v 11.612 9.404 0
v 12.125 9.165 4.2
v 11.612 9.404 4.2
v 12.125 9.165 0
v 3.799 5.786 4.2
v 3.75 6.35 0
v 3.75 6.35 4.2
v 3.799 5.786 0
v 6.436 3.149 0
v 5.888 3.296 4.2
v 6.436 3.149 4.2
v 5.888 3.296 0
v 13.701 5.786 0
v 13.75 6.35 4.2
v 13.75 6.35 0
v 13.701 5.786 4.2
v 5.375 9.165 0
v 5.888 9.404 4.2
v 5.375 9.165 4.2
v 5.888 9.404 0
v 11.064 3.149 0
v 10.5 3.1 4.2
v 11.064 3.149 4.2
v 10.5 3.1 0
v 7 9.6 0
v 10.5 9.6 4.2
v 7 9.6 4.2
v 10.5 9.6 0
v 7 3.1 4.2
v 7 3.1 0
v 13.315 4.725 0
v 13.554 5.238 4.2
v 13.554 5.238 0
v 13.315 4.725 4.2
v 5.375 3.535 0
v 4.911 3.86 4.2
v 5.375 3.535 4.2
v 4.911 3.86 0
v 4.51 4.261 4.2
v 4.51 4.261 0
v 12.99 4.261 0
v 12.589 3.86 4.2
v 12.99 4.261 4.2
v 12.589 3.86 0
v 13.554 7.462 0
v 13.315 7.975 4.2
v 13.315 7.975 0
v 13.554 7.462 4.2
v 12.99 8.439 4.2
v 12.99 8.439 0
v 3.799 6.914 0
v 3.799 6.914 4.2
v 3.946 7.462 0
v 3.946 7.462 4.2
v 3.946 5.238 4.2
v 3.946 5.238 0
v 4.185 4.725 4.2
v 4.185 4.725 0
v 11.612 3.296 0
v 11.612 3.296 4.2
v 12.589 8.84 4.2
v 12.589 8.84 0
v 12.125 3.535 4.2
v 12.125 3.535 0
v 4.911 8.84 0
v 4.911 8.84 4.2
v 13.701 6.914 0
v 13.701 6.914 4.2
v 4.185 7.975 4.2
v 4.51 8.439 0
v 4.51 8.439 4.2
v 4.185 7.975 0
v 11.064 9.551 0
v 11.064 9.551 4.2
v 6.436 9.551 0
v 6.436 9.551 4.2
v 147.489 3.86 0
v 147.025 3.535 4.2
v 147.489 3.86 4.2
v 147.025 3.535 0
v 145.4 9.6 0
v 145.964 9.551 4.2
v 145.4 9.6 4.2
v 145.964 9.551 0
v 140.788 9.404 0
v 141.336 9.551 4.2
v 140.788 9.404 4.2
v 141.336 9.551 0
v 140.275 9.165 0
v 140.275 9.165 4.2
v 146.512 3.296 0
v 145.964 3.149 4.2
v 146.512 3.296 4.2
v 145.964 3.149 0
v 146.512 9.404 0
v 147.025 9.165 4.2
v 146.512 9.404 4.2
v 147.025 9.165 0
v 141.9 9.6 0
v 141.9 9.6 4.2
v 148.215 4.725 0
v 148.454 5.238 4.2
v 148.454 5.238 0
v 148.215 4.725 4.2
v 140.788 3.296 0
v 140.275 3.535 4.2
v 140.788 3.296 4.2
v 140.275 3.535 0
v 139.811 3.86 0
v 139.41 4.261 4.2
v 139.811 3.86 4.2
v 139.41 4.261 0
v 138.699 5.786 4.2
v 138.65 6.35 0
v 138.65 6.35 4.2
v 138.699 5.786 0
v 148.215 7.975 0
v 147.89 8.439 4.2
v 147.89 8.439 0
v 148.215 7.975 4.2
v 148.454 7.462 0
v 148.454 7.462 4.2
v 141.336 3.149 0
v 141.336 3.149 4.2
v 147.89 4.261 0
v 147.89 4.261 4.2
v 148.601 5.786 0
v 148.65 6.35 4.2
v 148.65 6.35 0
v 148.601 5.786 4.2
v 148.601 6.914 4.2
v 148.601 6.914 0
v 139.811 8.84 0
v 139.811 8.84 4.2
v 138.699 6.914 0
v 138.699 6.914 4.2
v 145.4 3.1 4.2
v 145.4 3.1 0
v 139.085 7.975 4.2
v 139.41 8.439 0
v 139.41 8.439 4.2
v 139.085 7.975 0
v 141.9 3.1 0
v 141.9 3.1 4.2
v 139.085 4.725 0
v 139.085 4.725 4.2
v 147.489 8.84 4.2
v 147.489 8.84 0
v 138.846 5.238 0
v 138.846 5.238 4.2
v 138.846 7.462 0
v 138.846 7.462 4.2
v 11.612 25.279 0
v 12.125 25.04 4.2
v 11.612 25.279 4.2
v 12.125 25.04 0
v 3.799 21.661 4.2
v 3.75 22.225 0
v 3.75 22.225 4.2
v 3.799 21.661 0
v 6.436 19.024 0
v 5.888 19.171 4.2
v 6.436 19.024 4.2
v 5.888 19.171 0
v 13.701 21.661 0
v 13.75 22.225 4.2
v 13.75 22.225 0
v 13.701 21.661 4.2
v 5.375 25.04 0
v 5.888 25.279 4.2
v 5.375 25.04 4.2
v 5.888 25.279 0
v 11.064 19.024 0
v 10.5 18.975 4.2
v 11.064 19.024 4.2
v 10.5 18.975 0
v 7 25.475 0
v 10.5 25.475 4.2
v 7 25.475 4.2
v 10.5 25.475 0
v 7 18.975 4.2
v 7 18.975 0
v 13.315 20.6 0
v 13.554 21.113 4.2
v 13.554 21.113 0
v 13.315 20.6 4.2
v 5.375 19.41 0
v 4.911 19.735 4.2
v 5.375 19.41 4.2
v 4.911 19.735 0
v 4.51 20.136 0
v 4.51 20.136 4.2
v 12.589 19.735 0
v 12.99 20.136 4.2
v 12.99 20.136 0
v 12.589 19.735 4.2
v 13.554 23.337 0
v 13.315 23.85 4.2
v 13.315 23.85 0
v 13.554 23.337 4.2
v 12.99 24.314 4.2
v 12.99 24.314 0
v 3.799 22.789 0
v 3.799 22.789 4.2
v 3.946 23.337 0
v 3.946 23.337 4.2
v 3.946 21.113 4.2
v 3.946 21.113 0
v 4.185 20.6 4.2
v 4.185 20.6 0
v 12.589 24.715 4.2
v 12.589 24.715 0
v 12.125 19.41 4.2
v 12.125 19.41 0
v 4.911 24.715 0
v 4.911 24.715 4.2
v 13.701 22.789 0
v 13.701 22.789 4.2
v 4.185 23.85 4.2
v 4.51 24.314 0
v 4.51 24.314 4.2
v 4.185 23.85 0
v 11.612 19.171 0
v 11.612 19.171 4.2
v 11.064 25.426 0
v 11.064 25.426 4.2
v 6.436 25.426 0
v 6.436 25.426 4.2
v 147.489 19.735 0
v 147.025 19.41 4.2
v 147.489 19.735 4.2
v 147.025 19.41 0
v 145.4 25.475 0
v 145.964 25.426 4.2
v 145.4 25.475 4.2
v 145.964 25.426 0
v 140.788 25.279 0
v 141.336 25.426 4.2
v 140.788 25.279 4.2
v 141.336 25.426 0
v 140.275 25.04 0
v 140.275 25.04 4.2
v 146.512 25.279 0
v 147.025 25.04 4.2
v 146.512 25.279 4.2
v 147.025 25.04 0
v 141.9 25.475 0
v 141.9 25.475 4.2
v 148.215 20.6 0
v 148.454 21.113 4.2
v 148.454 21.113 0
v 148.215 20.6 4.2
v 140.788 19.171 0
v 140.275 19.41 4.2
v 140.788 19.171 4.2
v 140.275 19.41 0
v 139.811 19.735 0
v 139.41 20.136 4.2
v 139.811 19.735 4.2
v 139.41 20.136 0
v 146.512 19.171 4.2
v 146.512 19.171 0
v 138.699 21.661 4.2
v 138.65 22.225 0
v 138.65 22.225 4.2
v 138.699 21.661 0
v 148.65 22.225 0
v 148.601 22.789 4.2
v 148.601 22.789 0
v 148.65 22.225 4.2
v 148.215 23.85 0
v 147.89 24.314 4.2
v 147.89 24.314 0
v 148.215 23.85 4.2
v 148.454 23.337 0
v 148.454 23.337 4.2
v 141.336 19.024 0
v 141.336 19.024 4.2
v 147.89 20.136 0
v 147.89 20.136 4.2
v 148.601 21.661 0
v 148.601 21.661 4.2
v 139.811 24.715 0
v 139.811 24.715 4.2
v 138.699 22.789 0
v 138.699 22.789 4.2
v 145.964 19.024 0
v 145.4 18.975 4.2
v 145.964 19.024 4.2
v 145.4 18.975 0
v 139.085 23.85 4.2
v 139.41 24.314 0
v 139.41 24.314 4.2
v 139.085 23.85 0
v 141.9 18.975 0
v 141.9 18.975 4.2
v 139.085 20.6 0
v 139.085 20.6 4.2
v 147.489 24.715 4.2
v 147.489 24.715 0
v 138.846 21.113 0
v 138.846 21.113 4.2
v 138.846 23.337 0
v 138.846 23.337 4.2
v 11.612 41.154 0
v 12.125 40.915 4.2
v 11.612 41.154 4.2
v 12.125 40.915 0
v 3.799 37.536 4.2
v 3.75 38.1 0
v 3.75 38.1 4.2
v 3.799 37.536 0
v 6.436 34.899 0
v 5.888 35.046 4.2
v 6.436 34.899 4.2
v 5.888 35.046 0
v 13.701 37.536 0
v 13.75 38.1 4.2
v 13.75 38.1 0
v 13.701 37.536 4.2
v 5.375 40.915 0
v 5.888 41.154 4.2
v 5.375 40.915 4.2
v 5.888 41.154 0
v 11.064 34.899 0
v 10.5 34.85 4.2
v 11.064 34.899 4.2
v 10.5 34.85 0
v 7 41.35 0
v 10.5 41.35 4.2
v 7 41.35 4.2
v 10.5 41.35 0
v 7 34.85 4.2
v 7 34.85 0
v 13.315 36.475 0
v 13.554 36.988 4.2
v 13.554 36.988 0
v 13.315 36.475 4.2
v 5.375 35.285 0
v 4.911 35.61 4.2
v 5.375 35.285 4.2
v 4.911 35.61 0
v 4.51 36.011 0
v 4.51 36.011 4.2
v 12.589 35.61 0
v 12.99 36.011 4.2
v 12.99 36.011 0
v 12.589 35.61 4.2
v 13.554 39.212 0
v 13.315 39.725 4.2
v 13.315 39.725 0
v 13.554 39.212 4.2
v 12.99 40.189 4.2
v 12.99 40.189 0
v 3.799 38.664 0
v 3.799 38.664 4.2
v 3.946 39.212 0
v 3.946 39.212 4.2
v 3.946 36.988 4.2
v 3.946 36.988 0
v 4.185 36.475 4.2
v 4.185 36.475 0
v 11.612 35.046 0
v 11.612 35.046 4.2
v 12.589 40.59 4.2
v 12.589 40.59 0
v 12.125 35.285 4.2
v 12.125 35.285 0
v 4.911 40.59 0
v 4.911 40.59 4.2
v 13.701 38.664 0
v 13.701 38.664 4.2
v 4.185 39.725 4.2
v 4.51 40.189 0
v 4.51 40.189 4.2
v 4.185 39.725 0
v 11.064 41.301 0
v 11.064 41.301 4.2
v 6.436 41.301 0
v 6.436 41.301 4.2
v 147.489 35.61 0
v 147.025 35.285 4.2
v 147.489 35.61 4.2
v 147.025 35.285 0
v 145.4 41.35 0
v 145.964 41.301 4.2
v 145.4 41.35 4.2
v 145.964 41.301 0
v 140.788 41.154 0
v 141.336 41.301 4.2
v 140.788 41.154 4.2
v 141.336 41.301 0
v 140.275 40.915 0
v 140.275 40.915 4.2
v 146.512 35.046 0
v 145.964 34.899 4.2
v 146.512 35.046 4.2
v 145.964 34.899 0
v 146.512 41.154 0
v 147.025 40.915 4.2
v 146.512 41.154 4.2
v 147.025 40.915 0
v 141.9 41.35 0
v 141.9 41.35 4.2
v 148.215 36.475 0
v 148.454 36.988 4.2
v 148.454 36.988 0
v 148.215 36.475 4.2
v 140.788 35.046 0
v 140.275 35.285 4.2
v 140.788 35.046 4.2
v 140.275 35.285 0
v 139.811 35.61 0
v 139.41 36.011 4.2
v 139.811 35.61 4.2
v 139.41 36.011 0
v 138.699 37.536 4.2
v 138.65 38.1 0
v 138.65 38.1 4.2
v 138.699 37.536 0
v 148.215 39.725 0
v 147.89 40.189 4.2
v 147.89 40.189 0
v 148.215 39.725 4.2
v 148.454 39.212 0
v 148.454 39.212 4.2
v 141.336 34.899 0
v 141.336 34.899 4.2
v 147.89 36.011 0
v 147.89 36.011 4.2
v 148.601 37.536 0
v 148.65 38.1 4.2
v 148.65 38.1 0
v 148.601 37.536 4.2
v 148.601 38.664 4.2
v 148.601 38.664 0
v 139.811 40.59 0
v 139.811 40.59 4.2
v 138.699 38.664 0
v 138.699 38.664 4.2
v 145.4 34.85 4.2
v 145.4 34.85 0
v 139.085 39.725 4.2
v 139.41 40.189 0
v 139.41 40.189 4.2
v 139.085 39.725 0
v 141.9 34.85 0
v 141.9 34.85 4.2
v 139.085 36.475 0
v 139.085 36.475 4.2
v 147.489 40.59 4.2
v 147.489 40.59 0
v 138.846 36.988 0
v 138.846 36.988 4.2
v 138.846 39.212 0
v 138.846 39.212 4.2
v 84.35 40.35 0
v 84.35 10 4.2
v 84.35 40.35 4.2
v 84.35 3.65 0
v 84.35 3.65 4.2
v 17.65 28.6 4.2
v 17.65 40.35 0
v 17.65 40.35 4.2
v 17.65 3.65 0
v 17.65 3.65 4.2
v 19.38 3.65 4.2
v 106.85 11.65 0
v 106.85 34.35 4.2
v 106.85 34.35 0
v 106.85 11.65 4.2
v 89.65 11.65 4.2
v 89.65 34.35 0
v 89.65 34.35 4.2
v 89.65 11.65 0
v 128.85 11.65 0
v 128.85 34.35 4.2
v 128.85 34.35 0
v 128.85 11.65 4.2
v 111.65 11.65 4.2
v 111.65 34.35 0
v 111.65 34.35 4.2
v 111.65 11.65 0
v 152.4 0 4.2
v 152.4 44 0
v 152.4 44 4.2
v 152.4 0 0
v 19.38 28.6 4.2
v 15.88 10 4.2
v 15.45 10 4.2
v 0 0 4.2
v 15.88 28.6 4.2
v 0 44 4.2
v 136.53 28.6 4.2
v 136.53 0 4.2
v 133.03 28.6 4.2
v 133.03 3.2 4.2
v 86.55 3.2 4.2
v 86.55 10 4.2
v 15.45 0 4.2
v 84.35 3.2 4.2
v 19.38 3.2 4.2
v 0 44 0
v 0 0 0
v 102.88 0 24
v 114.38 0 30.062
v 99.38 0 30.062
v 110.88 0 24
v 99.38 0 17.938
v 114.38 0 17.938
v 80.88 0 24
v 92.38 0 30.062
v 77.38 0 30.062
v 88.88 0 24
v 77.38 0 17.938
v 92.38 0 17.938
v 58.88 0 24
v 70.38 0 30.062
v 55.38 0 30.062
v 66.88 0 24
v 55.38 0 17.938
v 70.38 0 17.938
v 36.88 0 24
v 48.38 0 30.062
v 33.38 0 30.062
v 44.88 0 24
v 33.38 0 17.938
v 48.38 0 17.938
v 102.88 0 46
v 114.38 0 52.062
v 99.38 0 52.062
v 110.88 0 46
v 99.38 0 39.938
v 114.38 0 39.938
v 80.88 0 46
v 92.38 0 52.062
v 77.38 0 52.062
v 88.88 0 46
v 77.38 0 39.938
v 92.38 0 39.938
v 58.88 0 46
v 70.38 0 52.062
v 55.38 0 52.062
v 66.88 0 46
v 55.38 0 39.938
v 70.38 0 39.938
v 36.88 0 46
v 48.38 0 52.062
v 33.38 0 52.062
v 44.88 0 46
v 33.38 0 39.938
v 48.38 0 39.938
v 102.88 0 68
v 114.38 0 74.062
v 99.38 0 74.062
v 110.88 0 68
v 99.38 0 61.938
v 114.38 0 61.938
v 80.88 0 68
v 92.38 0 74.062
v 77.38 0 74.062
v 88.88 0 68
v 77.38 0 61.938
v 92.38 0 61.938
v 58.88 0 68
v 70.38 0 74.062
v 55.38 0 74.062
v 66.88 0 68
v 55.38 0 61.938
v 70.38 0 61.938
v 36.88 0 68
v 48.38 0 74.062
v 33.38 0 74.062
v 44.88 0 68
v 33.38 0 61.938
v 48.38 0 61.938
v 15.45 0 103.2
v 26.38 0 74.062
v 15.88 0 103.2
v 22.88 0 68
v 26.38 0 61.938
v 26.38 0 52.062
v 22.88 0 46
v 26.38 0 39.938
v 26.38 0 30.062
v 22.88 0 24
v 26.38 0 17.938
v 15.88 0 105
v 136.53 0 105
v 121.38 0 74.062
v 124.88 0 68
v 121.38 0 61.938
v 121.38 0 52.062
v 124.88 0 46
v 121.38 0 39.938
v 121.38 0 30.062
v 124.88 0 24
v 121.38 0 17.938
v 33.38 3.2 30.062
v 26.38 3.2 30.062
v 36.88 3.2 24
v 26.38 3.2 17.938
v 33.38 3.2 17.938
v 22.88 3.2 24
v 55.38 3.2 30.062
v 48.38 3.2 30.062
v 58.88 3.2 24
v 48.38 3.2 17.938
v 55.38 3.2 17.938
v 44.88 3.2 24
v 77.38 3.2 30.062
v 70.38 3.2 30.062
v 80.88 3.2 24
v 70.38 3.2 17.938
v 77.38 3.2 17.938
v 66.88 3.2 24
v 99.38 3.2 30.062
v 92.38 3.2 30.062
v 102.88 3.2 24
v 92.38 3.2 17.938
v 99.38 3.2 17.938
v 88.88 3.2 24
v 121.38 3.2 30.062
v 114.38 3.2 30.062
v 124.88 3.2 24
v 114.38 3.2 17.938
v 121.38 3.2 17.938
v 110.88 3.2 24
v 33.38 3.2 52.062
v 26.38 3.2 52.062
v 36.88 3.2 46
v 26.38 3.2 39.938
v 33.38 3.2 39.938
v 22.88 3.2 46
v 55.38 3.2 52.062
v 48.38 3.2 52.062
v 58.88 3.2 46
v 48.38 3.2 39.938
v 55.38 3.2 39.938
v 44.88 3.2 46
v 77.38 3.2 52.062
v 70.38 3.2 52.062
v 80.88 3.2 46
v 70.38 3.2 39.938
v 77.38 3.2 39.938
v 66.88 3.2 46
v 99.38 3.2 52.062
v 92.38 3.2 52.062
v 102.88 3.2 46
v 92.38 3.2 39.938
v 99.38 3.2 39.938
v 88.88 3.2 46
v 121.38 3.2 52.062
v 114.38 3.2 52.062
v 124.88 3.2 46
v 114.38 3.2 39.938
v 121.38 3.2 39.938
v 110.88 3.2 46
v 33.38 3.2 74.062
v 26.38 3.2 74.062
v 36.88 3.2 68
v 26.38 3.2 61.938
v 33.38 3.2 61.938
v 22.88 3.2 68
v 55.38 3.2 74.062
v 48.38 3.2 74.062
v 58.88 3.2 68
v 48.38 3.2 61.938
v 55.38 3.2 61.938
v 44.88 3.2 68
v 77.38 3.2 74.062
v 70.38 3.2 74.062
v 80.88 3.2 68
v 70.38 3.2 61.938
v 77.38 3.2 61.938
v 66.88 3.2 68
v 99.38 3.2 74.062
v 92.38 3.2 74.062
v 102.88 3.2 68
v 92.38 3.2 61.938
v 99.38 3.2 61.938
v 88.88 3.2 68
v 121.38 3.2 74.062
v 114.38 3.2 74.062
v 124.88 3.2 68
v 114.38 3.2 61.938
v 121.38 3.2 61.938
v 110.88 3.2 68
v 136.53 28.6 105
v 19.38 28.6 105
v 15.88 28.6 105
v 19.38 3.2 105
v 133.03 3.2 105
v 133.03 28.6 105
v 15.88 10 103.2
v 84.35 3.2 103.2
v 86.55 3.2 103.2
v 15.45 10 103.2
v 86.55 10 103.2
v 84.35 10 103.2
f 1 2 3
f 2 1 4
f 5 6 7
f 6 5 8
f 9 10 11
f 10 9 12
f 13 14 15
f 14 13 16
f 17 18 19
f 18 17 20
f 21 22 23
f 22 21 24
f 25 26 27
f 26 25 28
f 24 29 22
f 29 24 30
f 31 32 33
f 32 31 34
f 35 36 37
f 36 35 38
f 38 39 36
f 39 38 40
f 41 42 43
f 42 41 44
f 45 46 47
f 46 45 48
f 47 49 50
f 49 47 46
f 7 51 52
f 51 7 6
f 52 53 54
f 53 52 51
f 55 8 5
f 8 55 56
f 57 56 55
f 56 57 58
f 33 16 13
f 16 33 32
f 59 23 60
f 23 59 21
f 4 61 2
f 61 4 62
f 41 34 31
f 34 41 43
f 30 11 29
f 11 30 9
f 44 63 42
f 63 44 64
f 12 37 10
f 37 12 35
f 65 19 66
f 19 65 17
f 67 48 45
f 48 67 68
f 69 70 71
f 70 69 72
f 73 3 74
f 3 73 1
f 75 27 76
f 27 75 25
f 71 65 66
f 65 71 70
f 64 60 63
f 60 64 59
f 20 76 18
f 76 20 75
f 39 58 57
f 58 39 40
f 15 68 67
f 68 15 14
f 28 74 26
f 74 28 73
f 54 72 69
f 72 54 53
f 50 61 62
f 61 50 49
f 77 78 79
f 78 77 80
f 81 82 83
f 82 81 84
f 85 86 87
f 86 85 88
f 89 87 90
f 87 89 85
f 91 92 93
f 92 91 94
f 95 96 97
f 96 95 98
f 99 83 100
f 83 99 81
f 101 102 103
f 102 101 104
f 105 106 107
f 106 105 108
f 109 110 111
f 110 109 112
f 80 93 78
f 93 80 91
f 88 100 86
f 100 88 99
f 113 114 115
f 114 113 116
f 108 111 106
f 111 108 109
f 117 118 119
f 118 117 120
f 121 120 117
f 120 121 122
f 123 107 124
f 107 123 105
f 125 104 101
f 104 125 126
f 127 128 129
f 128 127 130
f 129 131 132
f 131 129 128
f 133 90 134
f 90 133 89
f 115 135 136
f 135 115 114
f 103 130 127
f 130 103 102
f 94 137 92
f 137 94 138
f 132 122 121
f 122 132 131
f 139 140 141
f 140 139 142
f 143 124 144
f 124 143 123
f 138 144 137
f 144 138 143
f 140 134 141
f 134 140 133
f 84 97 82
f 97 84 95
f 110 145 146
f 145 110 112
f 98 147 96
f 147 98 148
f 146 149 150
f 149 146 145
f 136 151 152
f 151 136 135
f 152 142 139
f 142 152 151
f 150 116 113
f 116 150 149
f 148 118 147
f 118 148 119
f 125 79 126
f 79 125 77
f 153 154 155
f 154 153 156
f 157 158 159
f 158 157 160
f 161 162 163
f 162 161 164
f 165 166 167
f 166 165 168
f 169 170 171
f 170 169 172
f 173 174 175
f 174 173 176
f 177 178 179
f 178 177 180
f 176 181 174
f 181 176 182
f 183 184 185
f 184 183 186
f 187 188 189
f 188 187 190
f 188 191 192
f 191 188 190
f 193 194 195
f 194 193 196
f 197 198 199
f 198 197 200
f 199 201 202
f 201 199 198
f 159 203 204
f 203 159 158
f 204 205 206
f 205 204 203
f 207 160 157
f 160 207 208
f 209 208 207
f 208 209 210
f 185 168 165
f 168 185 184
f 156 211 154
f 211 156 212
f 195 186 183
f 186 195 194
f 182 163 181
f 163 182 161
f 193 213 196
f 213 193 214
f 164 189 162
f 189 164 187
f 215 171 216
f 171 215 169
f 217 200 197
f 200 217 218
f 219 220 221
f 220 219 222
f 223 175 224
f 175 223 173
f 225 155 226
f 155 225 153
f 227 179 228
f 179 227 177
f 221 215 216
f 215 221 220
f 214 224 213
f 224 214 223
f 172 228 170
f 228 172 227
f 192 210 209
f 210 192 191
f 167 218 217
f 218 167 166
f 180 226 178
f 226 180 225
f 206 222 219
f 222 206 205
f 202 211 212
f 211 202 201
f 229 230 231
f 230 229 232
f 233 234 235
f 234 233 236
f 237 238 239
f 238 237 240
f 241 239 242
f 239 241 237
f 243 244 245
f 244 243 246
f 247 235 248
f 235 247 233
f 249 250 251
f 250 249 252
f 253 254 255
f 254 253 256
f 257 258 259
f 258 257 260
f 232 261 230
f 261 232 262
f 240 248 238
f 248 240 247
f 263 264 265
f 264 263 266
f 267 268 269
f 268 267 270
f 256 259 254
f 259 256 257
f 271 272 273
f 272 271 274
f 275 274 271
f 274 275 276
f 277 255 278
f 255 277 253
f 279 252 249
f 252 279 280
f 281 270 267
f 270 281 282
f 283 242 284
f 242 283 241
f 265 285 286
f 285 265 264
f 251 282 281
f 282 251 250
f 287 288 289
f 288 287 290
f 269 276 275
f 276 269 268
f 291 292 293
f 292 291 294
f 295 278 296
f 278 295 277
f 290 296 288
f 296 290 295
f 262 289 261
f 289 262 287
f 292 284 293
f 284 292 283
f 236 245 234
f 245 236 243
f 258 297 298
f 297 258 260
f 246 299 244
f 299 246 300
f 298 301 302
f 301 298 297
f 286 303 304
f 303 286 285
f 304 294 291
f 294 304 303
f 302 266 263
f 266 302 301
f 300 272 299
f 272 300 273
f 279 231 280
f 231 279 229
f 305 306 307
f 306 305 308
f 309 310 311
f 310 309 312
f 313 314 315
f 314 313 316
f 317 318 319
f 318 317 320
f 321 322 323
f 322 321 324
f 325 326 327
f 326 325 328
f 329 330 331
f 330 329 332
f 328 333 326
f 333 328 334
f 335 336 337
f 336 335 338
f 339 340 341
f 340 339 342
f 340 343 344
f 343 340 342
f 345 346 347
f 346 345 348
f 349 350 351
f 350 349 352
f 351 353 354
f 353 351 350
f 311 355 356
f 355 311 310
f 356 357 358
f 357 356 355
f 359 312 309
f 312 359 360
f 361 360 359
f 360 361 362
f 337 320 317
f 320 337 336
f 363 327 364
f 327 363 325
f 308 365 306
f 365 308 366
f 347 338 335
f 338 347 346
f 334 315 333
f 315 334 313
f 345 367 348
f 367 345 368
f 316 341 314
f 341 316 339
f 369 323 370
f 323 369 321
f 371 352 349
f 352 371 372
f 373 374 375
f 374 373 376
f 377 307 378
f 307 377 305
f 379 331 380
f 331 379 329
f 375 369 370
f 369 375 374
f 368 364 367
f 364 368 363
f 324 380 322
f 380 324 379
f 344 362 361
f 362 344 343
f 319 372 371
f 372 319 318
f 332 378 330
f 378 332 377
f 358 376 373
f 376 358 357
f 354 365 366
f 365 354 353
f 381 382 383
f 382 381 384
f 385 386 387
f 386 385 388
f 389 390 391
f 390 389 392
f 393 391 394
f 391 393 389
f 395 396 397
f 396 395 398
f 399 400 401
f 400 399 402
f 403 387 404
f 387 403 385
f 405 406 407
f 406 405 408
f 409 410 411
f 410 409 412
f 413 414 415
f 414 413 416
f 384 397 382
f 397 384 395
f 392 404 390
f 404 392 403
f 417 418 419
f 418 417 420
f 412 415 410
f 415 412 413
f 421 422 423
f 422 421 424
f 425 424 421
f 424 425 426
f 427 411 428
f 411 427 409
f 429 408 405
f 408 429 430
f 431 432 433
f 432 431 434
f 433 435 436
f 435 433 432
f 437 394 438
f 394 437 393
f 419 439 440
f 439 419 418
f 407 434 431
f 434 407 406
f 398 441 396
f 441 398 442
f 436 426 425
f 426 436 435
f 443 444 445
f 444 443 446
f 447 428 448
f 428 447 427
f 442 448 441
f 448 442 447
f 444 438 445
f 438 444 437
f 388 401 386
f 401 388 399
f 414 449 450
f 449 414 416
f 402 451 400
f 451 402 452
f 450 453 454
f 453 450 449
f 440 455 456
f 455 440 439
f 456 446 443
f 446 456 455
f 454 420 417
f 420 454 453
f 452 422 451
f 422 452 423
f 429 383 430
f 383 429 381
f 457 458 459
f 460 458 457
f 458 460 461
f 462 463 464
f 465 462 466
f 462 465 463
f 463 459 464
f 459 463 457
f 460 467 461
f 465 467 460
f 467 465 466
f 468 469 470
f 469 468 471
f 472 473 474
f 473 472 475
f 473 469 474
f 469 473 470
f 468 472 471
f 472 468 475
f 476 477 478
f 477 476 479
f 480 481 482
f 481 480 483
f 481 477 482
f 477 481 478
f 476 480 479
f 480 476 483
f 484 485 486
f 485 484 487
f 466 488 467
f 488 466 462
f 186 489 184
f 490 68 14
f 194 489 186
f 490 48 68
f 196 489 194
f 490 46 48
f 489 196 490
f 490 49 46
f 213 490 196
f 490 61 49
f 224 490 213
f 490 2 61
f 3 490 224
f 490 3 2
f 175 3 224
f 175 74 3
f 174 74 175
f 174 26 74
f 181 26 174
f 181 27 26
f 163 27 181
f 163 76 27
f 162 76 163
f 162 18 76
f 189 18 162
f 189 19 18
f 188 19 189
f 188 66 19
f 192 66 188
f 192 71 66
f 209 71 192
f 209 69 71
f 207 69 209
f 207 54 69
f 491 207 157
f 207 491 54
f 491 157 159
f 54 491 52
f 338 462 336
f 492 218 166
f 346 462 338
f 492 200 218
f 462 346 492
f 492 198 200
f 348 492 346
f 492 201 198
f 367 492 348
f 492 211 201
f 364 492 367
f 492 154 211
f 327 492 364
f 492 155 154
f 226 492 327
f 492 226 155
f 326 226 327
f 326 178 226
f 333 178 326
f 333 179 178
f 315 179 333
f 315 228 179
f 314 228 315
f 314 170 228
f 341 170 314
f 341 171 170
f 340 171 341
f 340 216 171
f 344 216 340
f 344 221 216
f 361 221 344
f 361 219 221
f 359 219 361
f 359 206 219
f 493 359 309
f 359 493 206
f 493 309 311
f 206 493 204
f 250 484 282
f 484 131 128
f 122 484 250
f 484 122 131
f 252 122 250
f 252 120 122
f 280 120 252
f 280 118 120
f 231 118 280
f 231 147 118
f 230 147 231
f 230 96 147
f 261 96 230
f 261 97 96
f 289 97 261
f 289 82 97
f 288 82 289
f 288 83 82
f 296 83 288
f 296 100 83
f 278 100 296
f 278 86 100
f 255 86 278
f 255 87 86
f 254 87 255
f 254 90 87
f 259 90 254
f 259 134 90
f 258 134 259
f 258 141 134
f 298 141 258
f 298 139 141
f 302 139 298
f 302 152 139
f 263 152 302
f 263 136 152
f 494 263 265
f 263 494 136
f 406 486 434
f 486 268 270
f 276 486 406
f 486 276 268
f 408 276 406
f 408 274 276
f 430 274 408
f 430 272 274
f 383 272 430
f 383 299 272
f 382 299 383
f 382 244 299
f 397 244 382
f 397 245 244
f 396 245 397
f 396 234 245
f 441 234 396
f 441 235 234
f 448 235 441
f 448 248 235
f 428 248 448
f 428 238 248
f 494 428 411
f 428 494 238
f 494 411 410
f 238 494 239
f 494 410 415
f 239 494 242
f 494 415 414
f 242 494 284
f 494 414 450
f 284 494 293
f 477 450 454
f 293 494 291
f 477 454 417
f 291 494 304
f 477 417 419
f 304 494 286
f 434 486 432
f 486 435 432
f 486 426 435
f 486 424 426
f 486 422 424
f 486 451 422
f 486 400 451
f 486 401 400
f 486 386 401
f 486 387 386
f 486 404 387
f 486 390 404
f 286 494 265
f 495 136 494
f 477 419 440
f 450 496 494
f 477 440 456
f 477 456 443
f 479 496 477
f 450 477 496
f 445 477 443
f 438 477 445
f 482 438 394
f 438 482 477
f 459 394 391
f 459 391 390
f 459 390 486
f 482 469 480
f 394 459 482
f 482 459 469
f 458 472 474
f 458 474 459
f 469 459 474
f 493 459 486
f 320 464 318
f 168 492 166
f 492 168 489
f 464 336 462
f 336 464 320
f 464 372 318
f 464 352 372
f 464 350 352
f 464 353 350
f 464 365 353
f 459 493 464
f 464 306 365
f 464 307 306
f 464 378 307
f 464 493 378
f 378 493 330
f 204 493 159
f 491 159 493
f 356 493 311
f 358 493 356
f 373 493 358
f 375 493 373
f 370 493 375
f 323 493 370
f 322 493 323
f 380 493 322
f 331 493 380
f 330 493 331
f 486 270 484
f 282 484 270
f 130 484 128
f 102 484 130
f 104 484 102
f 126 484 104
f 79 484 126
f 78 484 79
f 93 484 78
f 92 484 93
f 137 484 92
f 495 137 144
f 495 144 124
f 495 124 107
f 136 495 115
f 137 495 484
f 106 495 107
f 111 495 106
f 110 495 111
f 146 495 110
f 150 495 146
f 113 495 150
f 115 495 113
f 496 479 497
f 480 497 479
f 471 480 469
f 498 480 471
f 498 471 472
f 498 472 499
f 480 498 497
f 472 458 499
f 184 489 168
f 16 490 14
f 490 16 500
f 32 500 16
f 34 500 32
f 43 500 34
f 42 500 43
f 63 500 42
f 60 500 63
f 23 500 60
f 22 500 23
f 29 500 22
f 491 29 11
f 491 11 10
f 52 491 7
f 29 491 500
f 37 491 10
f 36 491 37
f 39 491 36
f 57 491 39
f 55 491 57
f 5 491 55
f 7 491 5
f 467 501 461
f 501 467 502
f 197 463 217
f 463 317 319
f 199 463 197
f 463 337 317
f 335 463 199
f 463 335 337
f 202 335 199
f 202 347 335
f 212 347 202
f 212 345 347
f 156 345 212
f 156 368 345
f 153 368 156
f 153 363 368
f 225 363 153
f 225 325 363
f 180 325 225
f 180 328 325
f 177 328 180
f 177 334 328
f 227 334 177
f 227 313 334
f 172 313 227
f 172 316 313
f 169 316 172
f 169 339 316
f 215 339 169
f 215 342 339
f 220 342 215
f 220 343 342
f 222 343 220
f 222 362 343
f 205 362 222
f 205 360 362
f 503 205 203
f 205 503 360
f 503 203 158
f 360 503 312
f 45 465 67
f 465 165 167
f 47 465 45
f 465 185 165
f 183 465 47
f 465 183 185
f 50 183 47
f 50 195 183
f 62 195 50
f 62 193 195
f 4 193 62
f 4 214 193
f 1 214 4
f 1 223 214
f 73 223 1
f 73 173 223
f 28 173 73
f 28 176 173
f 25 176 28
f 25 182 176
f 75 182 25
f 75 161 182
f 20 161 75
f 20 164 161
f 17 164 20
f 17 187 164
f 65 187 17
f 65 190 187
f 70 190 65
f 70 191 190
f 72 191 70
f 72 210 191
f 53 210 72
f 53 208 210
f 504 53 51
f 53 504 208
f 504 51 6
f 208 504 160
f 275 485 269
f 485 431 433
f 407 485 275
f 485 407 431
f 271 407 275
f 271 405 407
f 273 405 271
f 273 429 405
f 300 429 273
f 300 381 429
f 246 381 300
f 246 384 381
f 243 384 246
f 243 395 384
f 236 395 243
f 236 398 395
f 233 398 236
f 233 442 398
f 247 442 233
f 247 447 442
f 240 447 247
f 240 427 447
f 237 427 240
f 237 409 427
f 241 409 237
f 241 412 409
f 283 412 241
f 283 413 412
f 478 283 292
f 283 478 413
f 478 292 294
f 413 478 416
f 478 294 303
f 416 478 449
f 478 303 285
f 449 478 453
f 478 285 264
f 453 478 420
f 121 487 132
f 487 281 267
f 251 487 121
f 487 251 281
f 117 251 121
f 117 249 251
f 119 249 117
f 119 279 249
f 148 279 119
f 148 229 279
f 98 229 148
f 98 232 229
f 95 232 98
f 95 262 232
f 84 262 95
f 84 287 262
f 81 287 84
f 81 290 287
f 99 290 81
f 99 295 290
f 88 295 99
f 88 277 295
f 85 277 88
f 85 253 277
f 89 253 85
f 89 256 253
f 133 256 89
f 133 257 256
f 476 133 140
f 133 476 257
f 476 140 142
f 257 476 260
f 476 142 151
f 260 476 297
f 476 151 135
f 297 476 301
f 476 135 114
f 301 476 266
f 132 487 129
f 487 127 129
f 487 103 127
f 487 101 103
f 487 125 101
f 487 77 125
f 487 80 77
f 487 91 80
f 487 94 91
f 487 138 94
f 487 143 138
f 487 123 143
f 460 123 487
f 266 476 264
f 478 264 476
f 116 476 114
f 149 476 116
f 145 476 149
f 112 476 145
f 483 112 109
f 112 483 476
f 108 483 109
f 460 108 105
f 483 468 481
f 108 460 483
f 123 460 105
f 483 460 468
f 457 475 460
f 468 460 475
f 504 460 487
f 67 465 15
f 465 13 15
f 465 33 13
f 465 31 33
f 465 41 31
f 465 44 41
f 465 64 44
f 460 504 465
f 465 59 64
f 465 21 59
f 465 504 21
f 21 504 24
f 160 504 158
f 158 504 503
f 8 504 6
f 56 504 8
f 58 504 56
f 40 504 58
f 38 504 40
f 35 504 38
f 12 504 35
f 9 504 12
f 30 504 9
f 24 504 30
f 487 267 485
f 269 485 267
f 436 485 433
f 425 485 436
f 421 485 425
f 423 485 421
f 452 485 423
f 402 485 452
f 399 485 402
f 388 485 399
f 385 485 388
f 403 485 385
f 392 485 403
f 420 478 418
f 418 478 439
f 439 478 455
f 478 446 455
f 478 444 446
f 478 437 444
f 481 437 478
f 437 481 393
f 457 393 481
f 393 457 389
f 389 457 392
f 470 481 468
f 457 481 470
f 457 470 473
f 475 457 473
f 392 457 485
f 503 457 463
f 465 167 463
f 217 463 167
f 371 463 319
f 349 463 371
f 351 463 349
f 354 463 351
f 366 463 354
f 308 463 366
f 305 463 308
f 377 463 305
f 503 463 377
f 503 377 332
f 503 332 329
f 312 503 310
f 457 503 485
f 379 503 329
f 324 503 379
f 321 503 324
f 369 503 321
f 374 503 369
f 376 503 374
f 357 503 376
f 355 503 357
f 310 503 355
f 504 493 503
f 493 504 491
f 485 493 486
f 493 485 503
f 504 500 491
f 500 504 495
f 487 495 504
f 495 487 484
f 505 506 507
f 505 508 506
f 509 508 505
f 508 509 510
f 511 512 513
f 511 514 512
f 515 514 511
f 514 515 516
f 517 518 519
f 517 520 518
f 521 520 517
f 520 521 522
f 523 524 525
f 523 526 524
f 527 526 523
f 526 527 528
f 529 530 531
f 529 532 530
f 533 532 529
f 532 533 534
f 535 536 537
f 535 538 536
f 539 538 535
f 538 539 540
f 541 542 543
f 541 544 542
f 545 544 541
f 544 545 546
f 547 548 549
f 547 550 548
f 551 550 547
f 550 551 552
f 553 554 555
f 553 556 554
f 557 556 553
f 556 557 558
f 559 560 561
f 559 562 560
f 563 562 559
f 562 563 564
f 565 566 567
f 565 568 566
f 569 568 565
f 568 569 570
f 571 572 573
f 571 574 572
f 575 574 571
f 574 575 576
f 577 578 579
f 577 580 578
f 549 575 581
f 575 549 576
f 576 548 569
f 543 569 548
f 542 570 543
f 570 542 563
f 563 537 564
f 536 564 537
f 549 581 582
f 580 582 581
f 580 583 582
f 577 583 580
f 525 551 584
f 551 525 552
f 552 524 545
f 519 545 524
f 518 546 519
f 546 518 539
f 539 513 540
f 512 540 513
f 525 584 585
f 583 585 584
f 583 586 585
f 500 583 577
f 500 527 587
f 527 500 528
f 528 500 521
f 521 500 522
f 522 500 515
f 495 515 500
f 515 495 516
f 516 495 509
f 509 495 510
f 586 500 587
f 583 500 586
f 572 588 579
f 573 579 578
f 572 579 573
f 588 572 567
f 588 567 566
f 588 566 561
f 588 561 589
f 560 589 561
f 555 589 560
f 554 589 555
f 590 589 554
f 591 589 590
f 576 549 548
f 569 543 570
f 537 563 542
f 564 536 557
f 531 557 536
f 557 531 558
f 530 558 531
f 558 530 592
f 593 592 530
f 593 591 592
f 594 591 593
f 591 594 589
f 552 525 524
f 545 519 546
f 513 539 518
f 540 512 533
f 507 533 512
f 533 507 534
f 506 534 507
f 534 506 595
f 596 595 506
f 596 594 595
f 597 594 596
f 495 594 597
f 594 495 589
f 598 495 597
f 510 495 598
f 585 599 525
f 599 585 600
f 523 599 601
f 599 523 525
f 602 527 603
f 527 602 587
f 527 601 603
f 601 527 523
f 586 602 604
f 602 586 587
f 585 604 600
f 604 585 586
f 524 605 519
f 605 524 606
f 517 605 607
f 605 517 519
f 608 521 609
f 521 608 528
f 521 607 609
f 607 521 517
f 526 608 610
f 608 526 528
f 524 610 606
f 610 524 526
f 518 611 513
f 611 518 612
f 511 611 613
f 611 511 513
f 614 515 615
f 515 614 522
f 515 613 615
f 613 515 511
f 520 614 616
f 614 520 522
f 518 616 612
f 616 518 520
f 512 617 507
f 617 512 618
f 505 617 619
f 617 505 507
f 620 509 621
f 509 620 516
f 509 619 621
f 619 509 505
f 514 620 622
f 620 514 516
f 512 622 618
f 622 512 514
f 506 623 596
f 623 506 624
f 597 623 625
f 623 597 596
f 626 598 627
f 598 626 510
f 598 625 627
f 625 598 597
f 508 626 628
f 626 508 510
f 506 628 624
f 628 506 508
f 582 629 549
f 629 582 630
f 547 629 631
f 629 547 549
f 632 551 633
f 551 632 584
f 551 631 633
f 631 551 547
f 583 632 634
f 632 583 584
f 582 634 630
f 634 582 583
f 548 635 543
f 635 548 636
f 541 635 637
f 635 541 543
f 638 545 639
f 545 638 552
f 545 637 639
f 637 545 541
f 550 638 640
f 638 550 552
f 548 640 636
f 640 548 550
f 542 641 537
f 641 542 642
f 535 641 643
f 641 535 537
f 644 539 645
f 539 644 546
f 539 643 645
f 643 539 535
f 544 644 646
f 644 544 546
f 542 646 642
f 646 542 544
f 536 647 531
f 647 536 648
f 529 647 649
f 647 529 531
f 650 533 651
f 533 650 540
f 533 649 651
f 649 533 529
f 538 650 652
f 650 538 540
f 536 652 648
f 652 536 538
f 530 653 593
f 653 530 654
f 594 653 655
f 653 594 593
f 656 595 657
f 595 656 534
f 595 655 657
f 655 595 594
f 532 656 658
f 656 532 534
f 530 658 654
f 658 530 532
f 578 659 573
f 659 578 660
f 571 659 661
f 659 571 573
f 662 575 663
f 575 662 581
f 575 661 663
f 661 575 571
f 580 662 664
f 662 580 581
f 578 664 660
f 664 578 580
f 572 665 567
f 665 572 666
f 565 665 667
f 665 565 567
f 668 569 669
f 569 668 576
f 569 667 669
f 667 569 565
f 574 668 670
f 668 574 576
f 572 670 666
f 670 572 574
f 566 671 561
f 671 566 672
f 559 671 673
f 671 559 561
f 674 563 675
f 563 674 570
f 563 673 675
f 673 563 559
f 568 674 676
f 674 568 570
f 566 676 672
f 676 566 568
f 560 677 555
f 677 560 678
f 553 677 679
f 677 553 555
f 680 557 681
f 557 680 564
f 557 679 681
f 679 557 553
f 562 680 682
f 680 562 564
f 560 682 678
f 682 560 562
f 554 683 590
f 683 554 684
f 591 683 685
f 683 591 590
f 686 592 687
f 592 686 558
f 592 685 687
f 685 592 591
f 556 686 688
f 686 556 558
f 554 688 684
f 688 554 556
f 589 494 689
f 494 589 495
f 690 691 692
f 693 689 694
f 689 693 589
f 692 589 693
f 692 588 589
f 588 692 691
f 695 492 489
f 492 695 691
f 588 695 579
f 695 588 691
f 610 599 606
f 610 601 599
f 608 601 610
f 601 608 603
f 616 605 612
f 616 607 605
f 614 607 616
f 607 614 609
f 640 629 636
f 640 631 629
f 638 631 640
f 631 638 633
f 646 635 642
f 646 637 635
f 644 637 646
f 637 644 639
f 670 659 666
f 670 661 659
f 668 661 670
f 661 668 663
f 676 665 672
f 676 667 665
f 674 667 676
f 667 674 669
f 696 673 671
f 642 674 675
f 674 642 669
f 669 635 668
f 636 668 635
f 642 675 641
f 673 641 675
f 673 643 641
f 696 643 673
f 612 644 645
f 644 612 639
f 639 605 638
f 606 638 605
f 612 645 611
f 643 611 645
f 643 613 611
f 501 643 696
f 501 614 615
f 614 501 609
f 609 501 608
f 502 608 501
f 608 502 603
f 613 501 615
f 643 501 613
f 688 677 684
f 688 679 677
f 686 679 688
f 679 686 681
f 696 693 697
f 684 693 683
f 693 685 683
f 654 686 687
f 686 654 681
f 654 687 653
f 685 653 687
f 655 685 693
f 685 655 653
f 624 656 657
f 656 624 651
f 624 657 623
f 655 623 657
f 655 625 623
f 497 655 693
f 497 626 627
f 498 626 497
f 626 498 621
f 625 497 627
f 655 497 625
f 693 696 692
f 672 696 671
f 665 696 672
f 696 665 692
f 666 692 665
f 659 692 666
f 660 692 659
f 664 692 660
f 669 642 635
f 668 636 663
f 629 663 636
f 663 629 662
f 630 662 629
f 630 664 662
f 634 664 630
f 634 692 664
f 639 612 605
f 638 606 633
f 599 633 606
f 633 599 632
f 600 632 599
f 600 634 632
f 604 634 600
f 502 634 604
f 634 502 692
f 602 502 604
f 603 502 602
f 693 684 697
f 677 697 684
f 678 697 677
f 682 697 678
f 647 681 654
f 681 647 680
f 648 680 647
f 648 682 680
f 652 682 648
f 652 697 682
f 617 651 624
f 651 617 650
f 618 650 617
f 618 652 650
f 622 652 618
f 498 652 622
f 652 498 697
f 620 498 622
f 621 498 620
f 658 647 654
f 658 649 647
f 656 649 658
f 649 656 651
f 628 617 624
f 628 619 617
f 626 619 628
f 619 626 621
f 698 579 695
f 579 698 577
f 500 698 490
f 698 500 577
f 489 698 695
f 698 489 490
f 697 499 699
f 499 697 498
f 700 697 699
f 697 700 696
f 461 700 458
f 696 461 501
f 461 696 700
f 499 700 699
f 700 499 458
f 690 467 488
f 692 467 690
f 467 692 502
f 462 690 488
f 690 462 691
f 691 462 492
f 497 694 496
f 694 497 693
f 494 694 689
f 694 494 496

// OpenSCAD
// ============================================================================
// RackArchitect MCP — Parametric 3D-Printable Rack Carrier (.scad)
// Blueprint: Printables Community 6-Inch 1U Raspberry Pi 5 + 2x Keystone Micro-Carrier (3dprint-6inch-rpi5-plus-keystone-carrier-1u)
// Standard:  6INCH EIA-310 (152.4mm Total Width, 1U = 44mm)
// Material:  PETG or ASA (25% Gyroid Infill, 4 Perimeters)
// ============================================================================

/* [EIA-310 Rack & Chassis Parameters (mm)] */
panel_width_mm = 152.4;
aperture_width_mm = 120.65;
hole_center_pitch_x_mm = 134.9;
panel_height_mm = 44;
u_count = 1;
faceplate_thickness_mm = 4.2;
tray_depth_mm = 105;
tray_floor_thickness_mm = 3.2;
side_gusset_thickness_mm = 3.5;
print_tolerance_mm = 0.35;
$fn = 36;

module oval_mounting_slot(slot_w = 10.0, slot_h = 6.5, thickness = 10.0) {
  hull() {
    translate([-(slot_w - slot_h) / 2, 0, -1]) cylinder(d = slot_h, h = thickness);
    translate([ (slot_w - slot_h) / 2, 0, -1]) cylinder(d = slot_h, h = thickness);
  }
}

module eia310_ear_holes() {
  left_hole_x = (panel_width_mm - hole_center_pitch_x_mm) / 2;
  right_hole_x = panel_width_mm - left_hole_x;
  for (u = [0 : u_count - 1]) {
    base_y = u * 44.45;
    for (offset_y = [6.35, 22.225, 38.10]) {
      if (base_y + offset_y < panel_height_mm - 3.0) {
        translate([left_hole_x, base_y + offset_y, 0]) oval_mounting_slot();
        translate([right_hole_x, base_y + offset_y, 0]) oval_mounting_slot();
      }
    }
  }
}

module slot_bay_cutouts() {
  // Slot 'rpi5-bay-1' (sbc-rpi5): 66 x 36 mm at X=18mm, Y=4mm
  translate([18 - print_tolerance_mm, 4 - print_tolerance_mm, -1.0])
    cube([66 + 2 * print_tolerance_mm, 36 + 2 * print_tolerance_mm, faceplate_thickness_mm + 2.0]);
  // Slot 'keystone-1' (standard-keystone): 16.5 x 22 mm at X=90mm, Y=12mm
  translate([90 - print_tolerance_mm, 12 - print_tolerance_mm, -1.0])
    cube([16.5 + 2 * print_tolerance_mm, 22 + 2 * print_tolerance_mm, faceplate_thickness_mm + 2.0]);
  // Slot 'keystone-2' (standard-keystone): 16.5 x 22 mm at X=112mm, Y=12mm
  translate([112 - print_tolerance_mm, 12 - print_tolerance_mm, -1.0])
    cube([16.5 + 2 * print_tolerance_mm, 22 + 2 * print_tolerance_mm, faceplate_thickness_mm + 2.0]);
}

module slot_retention_rails() {
  // Guide rails for 'rpi5-bay-1' (fused to tray floor Y=0..10mm)
  translate([18 - print_tolerance_mm - 2.2, 0, faceplate_thickness_mm])
    cube([2.2, 10, 99]);
  translate([84 + print_tolerance_mm, 0, faceplate_thickness_mm])
    cube([2.2, 10, 99]);
}

module honeycomb_vent_cutouts() {
  tray_x0 = 15.88 + 14;
  tray_x1 = panel_width_mm - 15.88 - 14;
  for (z = [24 : 22 : tray_depth_mm - 18]) {
    for (x = [tray_x0 : 22 : tray_x1]) {
      translate([x, -1.0, z]) rotate([-90, 0, 0]) cylinder(d = 14, h = tray_floor_thickness_mm + 2.0, $fn = 6);
    }
  }
}

module rack_carrier_assembly() {
  tray_x = 15.88;
  tray_w = aperture_width_mm;
  union() {
    // 1. Front EIA-310 Faceplate with Mounting Ears & Sub-Module Bay Cutouts
    difference() {
      cube([panel_width_mm, panel_height_mm, faceplate_thickness_mm]);
      eia310_ear_holes();
      slot_bay_cutouts();
    }
    // 2. L-Shaped Rear Support Tray Floor with Hexagonal Ventilation
    difference() {
      translate([tray_x, 0, faceplate_thickness_mm])
        cube([tray_w, tray_floor_thickness_mm, tray_depth_mm - faceplate_thickness_mm]);
      honeycomb_vent_cutouts();
    }
    // 3. Left & Right Structural Side Gussets
    translate([tray_x, 0, faceplate_thickness_mm])
      cube([side_gusset_thickness_mm, panel_height_mm * 0.65, tray_depth_mm - faceplate_thickness_mm]);
    translate([tray_x + tray_w - side_gusset_thickness_mm, 0, faceplate_thickness_mm])
      cube([side_gusset_thickness_mm, panel_height_mm * 0.65, tray_depth_mm - faceplate_thickness_mm]);
    // 4. Internal Sub-Module Guide Rails
    slot_retention_rails();
  }
}

rack_carrier_assembly();
